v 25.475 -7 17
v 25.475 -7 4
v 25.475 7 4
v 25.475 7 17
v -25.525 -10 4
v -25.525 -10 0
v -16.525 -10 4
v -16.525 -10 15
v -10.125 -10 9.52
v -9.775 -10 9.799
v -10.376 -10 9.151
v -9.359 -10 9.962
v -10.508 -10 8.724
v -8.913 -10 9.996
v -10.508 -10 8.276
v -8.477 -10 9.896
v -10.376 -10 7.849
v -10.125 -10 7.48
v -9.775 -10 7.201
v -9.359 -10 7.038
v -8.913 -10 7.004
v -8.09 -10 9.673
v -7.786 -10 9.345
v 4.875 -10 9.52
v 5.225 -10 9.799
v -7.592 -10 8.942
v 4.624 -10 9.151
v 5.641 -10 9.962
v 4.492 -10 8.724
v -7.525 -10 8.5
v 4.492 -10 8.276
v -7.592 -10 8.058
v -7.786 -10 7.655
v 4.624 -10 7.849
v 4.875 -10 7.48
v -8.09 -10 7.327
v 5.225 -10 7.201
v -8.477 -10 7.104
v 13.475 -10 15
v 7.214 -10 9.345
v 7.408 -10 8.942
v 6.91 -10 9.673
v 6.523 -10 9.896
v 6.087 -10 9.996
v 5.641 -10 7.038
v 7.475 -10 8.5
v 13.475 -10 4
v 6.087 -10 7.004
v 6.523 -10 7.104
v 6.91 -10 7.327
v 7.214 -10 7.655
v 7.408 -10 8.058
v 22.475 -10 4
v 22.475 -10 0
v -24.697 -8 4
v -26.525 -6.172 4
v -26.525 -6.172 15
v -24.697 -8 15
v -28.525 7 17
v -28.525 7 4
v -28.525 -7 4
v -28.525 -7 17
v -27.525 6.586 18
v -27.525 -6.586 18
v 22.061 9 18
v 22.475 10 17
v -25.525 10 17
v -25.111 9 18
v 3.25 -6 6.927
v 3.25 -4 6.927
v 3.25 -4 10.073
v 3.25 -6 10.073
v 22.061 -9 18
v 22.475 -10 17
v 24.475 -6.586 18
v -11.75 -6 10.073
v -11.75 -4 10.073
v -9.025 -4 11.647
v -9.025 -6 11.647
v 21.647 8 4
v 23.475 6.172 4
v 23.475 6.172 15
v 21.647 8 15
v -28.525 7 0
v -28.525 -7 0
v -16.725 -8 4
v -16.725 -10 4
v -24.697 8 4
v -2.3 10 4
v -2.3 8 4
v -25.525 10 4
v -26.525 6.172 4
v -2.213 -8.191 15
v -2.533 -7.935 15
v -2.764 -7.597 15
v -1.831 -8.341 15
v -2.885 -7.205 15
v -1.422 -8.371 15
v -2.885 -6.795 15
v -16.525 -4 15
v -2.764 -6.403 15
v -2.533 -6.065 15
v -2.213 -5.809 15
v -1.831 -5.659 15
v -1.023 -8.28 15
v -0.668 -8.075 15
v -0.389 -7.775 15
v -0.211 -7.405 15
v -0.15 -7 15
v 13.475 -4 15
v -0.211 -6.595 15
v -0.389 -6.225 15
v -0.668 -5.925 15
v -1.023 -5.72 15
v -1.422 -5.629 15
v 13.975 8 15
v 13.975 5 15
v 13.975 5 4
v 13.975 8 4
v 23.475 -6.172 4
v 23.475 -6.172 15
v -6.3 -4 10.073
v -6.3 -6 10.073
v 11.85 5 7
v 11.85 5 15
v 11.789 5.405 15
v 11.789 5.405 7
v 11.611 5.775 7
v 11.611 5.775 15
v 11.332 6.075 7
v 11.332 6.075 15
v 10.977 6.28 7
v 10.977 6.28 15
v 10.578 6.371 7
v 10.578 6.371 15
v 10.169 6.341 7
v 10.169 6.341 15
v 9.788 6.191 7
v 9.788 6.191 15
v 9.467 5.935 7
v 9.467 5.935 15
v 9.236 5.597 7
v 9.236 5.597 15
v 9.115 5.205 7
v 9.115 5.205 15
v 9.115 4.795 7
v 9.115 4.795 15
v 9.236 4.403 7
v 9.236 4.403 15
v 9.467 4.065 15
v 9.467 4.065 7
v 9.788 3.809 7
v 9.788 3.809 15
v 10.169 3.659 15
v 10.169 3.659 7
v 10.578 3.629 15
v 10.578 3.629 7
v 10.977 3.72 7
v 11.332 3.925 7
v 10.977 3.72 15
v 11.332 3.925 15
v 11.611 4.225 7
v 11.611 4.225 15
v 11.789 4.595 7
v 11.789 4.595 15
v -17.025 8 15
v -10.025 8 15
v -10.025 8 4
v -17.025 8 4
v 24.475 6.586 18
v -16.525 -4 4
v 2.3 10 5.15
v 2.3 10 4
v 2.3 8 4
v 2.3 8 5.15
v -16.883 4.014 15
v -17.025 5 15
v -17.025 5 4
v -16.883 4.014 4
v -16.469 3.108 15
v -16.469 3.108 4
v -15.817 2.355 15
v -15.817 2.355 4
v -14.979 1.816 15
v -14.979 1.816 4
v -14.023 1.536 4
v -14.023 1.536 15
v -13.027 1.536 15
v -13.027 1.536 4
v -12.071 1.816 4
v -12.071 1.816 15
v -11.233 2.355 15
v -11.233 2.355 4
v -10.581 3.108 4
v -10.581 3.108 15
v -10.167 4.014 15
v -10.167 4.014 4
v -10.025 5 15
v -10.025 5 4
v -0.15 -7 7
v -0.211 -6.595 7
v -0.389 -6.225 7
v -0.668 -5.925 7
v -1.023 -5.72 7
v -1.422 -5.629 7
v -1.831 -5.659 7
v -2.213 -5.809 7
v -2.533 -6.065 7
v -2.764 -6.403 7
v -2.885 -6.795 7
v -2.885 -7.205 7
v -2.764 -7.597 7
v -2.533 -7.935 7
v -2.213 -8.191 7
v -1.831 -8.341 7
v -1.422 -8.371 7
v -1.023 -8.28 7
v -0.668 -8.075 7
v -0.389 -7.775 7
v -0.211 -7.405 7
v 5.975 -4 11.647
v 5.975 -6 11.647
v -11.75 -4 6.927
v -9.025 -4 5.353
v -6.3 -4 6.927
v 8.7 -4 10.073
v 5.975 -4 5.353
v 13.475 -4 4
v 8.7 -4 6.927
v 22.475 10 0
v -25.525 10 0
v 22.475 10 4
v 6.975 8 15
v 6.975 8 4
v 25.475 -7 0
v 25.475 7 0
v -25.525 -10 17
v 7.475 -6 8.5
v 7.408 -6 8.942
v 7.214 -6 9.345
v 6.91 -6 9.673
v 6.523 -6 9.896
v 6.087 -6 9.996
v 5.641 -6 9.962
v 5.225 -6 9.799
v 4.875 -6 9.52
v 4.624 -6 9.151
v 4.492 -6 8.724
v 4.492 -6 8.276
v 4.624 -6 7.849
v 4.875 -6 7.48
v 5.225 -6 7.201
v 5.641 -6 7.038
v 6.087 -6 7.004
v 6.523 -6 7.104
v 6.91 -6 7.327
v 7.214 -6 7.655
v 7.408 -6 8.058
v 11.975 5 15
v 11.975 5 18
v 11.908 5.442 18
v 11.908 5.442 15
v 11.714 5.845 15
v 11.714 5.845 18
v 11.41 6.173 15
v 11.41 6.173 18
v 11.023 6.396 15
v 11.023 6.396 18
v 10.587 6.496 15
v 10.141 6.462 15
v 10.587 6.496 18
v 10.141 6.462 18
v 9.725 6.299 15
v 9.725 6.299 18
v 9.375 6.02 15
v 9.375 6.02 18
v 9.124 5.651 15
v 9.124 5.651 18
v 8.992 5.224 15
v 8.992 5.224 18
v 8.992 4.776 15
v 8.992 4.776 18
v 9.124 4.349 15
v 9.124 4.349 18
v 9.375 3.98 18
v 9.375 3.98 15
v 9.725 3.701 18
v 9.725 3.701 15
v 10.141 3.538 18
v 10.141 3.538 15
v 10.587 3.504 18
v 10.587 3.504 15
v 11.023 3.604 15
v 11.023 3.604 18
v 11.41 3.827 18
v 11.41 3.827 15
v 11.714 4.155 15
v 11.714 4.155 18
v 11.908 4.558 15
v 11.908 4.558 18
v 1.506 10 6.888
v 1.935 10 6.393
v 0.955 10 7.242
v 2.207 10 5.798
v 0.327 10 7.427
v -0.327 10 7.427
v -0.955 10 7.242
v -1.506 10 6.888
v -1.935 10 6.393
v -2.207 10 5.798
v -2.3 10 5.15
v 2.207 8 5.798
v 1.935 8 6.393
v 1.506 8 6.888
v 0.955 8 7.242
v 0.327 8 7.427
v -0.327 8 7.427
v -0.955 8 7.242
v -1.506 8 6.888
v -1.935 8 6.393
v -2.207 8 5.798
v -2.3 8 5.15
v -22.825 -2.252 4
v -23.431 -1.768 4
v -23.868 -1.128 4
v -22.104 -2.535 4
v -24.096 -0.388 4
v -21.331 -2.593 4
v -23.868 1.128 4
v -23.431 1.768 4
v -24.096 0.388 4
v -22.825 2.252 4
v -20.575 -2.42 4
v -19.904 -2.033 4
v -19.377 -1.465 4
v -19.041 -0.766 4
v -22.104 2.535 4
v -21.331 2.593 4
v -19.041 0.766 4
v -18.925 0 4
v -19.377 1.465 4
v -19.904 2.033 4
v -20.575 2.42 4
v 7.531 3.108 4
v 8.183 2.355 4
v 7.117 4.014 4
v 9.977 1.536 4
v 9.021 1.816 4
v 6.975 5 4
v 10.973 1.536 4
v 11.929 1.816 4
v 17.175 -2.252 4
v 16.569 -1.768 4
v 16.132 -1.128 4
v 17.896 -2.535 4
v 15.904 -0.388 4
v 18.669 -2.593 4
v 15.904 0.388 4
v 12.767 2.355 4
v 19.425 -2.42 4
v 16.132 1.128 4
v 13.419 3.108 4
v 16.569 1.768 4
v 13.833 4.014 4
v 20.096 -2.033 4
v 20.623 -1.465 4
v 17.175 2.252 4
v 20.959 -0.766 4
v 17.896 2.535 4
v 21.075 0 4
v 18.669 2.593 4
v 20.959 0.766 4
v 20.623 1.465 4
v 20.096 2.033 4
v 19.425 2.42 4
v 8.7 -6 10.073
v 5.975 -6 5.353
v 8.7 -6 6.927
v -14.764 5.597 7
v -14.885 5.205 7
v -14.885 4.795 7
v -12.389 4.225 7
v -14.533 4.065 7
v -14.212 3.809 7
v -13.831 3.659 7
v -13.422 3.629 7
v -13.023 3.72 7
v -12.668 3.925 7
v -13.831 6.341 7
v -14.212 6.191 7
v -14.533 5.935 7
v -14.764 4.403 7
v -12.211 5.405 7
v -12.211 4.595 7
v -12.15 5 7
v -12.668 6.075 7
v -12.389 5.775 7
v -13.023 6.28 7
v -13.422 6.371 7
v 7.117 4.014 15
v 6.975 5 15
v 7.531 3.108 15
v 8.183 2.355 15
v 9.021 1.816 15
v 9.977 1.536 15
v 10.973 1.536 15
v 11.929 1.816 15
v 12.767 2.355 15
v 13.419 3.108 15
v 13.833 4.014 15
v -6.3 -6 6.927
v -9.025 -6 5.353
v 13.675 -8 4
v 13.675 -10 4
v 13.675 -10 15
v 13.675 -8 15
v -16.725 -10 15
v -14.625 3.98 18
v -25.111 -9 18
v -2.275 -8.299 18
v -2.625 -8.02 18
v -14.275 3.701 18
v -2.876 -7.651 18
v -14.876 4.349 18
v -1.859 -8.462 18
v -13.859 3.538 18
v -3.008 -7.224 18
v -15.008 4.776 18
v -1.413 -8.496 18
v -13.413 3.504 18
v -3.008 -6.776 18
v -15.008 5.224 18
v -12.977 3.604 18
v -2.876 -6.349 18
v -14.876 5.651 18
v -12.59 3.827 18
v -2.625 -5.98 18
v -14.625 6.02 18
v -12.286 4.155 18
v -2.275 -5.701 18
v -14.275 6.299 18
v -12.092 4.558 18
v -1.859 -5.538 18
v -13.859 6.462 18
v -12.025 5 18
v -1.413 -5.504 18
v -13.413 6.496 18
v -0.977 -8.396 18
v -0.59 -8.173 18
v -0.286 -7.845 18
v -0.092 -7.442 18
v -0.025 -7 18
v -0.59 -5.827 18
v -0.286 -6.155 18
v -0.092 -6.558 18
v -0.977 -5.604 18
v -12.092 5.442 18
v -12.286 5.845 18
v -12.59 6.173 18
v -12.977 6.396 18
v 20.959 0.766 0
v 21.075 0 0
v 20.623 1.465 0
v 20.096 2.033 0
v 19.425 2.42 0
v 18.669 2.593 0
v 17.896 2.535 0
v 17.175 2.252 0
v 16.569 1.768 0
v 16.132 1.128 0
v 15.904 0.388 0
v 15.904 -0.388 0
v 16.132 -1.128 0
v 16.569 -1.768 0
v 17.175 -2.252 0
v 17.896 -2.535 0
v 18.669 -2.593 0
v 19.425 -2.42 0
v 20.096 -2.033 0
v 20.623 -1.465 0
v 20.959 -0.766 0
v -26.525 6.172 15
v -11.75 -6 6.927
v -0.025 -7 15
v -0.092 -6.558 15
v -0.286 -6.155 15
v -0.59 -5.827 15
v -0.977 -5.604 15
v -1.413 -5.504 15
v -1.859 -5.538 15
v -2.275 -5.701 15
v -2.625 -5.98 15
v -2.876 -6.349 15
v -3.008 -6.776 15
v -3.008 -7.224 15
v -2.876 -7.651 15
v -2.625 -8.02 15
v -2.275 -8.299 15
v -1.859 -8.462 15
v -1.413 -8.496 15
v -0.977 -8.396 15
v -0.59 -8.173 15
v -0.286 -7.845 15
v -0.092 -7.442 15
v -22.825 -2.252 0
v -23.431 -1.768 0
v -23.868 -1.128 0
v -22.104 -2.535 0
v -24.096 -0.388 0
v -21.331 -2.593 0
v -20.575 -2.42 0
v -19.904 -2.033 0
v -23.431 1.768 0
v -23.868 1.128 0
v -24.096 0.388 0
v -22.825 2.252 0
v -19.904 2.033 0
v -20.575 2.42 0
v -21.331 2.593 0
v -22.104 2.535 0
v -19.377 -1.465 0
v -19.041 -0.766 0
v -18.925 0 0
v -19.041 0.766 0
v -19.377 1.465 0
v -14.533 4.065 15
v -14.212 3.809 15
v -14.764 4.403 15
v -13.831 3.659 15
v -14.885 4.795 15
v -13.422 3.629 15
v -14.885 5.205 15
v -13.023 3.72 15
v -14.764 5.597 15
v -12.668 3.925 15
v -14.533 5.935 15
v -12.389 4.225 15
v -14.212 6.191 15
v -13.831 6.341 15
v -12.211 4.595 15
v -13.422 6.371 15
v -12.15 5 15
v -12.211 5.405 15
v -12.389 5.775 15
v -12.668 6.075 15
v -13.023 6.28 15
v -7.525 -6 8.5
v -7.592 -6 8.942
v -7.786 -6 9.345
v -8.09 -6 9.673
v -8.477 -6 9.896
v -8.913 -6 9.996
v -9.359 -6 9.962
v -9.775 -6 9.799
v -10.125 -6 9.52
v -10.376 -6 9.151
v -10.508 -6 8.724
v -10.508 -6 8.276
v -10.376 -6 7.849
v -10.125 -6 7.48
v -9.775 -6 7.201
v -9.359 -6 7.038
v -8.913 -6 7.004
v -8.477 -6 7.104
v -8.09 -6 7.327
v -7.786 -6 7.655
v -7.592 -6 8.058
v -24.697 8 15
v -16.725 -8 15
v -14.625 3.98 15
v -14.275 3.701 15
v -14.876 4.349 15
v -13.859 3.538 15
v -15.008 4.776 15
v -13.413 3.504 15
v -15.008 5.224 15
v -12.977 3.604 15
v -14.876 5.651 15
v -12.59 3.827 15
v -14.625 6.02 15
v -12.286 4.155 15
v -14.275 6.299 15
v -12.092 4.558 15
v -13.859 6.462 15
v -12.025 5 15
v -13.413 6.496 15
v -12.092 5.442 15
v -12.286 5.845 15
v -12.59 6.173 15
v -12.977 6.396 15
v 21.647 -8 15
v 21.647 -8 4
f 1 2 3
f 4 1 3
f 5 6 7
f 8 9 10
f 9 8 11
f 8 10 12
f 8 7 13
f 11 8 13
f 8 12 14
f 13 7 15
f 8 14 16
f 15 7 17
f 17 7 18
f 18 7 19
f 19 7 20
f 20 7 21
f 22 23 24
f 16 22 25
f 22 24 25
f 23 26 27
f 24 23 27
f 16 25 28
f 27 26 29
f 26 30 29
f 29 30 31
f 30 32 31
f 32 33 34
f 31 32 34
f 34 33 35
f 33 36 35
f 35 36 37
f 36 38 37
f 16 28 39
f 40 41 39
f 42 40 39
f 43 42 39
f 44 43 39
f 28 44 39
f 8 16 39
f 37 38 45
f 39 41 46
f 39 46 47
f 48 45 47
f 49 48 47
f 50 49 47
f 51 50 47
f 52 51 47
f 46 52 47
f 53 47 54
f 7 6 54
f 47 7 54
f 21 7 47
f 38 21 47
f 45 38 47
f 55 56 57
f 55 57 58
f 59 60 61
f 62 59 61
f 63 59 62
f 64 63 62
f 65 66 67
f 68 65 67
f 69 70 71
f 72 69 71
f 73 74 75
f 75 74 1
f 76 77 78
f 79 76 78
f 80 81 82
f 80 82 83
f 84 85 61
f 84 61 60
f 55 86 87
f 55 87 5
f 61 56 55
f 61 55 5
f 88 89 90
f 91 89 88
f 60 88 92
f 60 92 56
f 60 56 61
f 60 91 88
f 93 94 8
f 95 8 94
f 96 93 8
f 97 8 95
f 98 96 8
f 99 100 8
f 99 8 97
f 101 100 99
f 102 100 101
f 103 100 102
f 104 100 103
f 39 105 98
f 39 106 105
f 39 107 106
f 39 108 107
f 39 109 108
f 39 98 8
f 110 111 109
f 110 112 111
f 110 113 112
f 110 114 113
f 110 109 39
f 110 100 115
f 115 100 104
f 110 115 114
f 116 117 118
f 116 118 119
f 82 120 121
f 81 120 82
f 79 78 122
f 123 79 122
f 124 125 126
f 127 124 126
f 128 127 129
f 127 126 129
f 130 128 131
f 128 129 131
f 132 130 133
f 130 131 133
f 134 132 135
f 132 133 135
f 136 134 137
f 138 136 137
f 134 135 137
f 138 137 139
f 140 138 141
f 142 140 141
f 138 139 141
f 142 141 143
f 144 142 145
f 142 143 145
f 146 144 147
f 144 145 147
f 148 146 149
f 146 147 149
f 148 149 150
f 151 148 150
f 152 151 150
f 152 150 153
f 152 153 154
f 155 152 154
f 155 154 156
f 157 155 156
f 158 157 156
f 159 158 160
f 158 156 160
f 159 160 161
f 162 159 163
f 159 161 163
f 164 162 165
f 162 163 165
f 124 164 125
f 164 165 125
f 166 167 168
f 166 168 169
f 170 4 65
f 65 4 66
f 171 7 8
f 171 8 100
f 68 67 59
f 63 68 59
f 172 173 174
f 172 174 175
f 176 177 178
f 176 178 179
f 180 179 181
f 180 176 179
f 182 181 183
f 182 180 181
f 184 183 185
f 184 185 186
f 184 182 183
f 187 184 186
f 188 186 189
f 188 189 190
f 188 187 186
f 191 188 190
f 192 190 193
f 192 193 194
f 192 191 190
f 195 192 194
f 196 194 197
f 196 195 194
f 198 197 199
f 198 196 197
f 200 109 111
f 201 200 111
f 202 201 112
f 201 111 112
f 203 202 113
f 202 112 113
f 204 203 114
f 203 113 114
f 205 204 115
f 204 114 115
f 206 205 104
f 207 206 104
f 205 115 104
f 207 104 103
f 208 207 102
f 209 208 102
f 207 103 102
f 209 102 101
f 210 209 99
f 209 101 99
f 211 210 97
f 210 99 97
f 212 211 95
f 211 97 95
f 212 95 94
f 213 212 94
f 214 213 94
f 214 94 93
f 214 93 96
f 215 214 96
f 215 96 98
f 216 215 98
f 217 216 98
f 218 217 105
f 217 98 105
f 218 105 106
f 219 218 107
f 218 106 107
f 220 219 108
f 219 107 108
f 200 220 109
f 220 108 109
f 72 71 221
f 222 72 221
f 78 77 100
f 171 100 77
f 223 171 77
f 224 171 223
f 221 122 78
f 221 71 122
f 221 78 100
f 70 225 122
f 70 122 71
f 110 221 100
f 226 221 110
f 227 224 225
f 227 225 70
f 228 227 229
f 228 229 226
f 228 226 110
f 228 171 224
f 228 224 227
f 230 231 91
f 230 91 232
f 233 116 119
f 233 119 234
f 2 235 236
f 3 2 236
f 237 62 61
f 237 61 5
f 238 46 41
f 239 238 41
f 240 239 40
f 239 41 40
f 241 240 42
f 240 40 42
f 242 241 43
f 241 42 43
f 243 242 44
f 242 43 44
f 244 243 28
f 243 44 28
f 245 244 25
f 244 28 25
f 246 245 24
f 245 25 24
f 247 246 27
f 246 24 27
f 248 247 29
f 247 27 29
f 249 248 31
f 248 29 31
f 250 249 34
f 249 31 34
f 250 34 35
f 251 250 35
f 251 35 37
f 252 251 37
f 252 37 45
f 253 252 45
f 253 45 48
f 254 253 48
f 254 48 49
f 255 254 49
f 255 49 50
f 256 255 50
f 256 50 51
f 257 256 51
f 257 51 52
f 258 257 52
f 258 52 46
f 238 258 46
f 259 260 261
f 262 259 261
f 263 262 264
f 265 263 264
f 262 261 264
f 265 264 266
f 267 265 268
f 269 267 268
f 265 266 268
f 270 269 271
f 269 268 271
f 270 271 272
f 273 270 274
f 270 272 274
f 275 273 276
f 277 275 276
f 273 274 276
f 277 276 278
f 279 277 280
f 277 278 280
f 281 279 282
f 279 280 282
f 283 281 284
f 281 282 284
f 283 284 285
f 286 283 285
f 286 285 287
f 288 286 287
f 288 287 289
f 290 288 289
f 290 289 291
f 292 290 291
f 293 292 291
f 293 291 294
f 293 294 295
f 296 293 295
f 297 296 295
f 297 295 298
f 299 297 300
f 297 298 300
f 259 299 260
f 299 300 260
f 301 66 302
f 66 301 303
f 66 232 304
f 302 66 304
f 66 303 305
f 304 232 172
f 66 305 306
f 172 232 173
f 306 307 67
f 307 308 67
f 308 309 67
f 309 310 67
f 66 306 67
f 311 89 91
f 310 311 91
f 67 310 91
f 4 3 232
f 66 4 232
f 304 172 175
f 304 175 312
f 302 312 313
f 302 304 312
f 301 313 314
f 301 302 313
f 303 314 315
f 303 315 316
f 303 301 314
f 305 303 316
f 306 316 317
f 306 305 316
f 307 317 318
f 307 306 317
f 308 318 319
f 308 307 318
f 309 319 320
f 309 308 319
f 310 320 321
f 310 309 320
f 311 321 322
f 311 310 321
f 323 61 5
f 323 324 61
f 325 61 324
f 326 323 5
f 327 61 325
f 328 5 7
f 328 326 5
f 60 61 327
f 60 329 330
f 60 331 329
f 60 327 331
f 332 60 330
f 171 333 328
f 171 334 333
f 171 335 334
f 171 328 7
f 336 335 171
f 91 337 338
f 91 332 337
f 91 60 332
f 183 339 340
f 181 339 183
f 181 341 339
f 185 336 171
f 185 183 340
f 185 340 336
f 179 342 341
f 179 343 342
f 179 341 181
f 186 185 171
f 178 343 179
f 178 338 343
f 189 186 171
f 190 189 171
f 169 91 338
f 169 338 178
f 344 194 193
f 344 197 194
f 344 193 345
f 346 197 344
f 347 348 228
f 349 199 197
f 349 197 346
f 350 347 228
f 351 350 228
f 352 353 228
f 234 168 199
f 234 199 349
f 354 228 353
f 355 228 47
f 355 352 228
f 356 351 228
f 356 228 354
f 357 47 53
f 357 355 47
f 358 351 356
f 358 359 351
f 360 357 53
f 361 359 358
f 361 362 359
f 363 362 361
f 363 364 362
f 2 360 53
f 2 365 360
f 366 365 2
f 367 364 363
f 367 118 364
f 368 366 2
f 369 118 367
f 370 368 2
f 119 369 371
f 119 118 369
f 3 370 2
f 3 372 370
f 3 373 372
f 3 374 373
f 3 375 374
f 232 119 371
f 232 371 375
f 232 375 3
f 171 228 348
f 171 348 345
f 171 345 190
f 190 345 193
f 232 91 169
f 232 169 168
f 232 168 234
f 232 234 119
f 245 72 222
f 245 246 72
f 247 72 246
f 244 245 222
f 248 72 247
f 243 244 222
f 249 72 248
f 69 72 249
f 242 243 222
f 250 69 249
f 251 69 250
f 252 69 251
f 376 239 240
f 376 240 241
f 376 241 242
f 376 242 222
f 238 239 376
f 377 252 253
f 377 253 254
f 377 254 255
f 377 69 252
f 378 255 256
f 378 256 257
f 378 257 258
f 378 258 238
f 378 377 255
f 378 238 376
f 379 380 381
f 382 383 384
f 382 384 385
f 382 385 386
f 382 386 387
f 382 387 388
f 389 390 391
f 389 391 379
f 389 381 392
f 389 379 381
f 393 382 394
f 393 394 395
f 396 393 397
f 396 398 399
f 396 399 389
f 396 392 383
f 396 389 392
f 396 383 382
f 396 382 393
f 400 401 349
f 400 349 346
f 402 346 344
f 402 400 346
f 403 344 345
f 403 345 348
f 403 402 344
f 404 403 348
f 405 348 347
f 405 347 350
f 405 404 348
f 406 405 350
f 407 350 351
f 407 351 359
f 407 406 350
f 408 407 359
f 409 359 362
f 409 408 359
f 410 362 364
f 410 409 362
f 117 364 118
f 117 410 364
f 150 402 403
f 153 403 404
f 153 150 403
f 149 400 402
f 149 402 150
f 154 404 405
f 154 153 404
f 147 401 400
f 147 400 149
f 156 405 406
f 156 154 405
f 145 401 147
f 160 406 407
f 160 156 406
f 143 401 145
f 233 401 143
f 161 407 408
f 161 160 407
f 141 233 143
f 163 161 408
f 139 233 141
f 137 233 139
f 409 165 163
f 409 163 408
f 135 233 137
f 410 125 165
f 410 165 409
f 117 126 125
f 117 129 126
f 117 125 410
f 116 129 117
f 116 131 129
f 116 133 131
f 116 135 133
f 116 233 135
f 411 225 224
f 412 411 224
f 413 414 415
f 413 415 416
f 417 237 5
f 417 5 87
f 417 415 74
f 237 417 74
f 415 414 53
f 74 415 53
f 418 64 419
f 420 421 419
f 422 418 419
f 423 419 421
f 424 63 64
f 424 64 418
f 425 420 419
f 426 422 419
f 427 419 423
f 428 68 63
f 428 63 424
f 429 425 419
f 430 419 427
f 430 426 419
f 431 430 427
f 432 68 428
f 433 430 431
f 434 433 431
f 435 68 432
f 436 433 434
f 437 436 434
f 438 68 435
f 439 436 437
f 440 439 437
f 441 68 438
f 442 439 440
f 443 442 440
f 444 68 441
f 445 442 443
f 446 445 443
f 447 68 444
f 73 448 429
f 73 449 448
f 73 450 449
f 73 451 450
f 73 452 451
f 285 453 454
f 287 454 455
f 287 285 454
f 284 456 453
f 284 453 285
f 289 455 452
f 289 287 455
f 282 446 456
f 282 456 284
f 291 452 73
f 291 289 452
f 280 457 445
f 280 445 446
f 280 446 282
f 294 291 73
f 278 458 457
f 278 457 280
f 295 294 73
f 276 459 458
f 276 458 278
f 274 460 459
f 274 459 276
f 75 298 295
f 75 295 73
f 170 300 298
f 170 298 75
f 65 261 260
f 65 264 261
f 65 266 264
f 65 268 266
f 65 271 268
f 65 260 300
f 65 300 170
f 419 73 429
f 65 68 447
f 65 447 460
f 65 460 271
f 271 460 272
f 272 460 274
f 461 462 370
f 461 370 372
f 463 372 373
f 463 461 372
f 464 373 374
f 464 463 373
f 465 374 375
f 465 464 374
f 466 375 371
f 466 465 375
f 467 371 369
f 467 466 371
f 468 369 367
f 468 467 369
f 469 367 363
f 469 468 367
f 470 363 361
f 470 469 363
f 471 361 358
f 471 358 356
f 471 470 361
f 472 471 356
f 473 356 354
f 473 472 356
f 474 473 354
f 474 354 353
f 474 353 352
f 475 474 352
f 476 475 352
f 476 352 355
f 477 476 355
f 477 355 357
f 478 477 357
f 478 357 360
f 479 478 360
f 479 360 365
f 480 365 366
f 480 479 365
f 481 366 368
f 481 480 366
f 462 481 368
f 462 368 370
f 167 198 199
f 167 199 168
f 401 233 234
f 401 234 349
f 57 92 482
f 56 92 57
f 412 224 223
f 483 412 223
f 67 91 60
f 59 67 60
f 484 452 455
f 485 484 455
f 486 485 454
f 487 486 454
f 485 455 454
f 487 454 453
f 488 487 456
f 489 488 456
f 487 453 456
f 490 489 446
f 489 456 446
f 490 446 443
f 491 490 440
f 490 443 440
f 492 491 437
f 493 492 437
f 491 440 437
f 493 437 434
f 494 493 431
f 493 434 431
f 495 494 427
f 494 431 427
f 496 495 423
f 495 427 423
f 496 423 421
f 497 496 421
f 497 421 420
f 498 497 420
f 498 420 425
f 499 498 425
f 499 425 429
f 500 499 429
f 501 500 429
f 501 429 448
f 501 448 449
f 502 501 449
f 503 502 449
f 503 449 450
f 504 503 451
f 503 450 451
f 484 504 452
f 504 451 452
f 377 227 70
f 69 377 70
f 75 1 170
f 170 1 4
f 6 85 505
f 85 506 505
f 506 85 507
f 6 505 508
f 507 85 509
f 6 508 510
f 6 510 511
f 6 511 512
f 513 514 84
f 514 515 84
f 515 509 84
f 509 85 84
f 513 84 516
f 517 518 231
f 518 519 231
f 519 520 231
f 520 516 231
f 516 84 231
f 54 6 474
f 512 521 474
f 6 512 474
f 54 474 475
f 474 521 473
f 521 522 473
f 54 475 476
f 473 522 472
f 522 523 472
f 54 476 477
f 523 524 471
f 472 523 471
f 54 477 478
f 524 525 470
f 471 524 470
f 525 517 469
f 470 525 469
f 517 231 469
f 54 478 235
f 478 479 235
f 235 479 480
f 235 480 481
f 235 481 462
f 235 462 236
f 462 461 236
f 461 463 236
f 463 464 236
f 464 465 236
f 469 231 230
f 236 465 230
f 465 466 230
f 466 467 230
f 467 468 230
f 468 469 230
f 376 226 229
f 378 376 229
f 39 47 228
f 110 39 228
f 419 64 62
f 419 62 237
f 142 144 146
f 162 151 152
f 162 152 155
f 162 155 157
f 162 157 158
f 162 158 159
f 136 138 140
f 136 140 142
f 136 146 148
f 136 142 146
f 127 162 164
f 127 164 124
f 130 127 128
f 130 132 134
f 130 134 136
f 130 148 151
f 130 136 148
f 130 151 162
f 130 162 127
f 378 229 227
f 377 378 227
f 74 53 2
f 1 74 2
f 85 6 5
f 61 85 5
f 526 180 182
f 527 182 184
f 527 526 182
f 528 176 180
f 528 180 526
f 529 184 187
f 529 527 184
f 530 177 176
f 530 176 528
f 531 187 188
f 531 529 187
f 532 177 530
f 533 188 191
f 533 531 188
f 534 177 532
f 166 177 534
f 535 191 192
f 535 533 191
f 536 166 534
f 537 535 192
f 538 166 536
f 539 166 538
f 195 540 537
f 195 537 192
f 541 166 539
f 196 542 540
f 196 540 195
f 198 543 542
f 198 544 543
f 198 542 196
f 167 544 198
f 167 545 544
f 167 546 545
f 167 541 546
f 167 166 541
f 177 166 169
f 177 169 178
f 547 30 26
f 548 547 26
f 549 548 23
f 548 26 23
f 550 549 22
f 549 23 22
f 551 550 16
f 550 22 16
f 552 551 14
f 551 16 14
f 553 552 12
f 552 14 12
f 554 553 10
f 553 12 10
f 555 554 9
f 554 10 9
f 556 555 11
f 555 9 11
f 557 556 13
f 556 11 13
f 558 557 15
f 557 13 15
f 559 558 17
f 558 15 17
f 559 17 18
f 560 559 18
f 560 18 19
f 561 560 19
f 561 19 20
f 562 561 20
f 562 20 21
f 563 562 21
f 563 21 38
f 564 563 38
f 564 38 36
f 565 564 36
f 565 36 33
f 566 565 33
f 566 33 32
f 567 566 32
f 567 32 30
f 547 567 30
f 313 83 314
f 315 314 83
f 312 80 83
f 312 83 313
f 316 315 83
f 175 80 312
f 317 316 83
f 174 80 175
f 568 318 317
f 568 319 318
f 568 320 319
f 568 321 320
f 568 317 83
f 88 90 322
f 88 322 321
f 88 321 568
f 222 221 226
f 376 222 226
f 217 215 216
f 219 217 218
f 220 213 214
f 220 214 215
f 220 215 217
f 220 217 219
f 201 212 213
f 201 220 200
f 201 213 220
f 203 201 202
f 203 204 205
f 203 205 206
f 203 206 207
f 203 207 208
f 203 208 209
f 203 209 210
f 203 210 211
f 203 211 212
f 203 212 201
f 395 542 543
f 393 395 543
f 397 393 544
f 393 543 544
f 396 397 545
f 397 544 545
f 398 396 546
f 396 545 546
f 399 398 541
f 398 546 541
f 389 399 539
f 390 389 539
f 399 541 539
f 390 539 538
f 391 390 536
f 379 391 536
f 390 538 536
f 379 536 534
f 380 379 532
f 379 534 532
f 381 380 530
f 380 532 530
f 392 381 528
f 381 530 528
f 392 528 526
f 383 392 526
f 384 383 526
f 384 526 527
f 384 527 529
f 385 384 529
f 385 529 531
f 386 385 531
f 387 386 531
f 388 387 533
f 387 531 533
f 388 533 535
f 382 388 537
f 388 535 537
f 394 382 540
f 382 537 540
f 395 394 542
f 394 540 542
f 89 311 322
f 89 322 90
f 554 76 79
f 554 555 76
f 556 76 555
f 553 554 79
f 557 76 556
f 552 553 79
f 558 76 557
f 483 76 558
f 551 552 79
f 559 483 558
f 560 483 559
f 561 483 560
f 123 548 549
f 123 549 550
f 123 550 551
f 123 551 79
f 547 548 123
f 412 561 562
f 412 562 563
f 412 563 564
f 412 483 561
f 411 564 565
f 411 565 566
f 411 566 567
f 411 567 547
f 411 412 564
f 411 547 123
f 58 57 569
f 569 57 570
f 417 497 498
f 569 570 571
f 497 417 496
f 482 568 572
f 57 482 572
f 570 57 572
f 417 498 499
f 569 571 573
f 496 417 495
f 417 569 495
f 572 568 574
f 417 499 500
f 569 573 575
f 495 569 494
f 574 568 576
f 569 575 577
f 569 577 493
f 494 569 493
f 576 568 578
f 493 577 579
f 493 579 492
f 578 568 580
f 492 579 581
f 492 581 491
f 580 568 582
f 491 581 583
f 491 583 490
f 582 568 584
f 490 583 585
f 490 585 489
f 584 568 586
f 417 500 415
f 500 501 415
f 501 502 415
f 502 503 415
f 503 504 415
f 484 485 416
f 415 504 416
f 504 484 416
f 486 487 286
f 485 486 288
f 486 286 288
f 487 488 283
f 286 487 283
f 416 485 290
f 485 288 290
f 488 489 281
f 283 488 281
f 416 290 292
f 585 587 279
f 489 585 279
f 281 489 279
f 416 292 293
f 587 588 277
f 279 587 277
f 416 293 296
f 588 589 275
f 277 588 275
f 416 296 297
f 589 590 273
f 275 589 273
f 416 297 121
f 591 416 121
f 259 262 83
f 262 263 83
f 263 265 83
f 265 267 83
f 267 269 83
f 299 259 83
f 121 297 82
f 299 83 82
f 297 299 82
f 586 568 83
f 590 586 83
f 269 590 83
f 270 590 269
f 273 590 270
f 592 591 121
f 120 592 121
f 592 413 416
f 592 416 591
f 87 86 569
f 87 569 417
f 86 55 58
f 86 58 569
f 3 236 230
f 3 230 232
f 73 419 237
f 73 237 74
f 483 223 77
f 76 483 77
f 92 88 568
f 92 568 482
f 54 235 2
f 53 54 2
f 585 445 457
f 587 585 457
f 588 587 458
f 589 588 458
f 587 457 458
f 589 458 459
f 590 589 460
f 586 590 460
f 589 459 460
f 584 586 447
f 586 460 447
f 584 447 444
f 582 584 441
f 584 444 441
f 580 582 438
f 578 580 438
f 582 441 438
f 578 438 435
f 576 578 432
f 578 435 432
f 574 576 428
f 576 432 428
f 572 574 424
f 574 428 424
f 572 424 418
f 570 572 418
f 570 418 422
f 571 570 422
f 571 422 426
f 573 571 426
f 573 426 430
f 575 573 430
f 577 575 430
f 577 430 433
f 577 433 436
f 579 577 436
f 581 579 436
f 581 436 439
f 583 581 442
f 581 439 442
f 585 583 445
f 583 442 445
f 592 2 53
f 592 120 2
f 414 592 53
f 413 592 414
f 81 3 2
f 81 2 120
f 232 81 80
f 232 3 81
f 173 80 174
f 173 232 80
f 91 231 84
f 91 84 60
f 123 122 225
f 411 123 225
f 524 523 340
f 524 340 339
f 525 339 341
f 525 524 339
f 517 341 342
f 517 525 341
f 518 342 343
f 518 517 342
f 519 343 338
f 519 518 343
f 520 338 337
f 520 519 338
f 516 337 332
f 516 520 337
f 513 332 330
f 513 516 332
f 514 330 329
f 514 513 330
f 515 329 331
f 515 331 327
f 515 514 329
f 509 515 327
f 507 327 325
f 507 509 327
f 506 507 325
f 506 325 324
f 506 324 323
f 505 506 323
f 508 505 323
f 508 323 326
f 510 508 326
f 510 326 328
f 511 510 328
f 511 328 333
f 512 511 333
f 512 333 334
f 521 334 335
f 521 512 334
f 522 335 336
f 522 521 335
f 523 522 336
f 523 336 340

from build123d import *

# Parameters (mm, degrees)
SKETCH3_W           = 54
SKETCH3_H           = 20
SKETCH3_R           = 2.6
BOSS_EXTRUDE1_DEPTH = 4
SKETCH4_W           = 30
SKETCH4_H           = 6
BOSS_EXTRUDE2_DEPTH = 11
SKETCH5_R           = 1.5
CUT_EXTRUDE1_DEPTH  = 6
CUT_EXTRUDE2_DEPTH  = 2
CHAMFER1_SIZE       = 3
BOSS_EXTRUDE3_DEPTH = 11
BOSS_EXTRUDE4_DEPTH = 3
SKETCH11_R          = 1.5
CUT_EXTRUDE3_DEPTH  = 3
BOSS_EXTRUDE5_DEPTH = 11
SKETCH13_R          = 1.375
CUT_EXTRUDE4_DEPTH  = 8
CHAMFER2_SIZE       = 1
CUT_EXTRUDE5_DEPTH  = 2


with BuildPart() as part:
    # Sketch3 → Boss-Extrude1 (new body)
    with BuildSketch(Plane.XY):
        with Locations((-1.525, 0)):
            Rectangle(SKETCH3_W, SKETCH3_H)
        with Locations((-21.525, 0)):
            Circle(SKETCH3_R, mode=Mode.SUBTRACT)
        with Locations((18.475, 0)):
            Circle(SKETCH3_R, mode=Mode.SUBTRACT)
    extrude(amount=BOSS_EXTRUDE1_DEPTH)

    # Sketch4 → Boss-Extrude2 (add)
    with BuildSketch(Plane.XY.offset(4)):
        with Locations((-1.525, -7)):
            Rectangle(SKETCH4_W, SKETCH4_H)
    extrude(amount=BOSS_EXTRUDE2_DEPTH)

    # Sketch5 → Cut-Extrude1 (cut)
    with BuildSketch(Plane.XZ.offset(10)):
        with Locations((-9.025, 8.5)):
            Circle(SKETCH5_R)
        with Locations((5.975, 8.5)):
            Circle(SKETCH5_R)
    extrude(amount=-CUT_EXTRUDE1_DEPTH, mode=Mode.SUBTRACT)

    # Sketch6 → Cut-Extrude2 (cut)
    with BuildSketch(Plane(origin=(0, -4, 0), x_dir=(1, 0, 0), z_dir=(0, 1, 0))):
        Polygon((-9.025, -5.353441033), (-11.75, -6.926720516), (-11.75, -10.073279484), (-9.025, -11.646558967), (-6.3, -10.073279484), (-6.3, -6.926720516), align=None)
        Polygon((5.975, -5.353441033), (3.25, -6.926720516), (3.25, -10.073279484), (5.975, -11.646558967), (8.7, -10.073279484), (8.7, -6.926720516), align=None)
    extrude(amount=-CUT_EXTRUDE2_DEPTH, mode=Mode.SUBTRACT)

    # Chamfer1
    chamfer1_edges = [part.edges().sort_by_distance(p)[0] for p in [
        (-28.525, 10, 2),
        (25.475, 10, 2),
        (25.475, -10, 2),
        (-28.525, -10, 2),
    ]]
    chamfer(chamfer1_edges, length=CHAMFER1_SIZE)

    # Sketch12 → Boss-Extrude5 (add)
    with BuildSketch(Plane(origin=(0, 0, 15), x_dir=(-1, 0, 0), z_dir=(0, 0, -1))):
        with BuildLine():
            Line((10.025, 5), (10.025, 8))
            Line((10.025, 8), (17.025, 8))
            Line((17.025, 8), (17.025, 5))
            ThreePointArc((17.025, 5), (13.525, 1.5), (10.025, 5))
        make_face()
        with BuildLine():
            Line((-13.975, 5), (-13.975, 8))
            Line((-13.975, 8), (-6.975, 8))
            Line((-6.975, 8), (-6.975, 5))
            ThreePointArc((-6.975, 5), (-10.475, 1.5), (-13.975, 5))
        make_face()
    extrude(amount=BOSS_EXTRUDE5_DEPTH)

    # Sketch13 → Cut-Extrude4 (cut)
    with BuildSketch(Plane.XY.offset(15)):
        with Locations((-13.525, 5)):
            Circle(SKETCH13_R)
        with Locations((10.475, 5)):
            Circle(SKETCH13_R)
        with Locations((-1.525, -7)):
            Circle(SKETCH13_R)
    extrude(amount=-CUT_EXTRUDE4_DEPTH, mode=Mode.SUBTRACT)


with BuildPart() as body_2:
    # Sketch9 → Boss-Extrude3 (new body)
    with BuildSketch(Plane.XY.offset(4)):
        Polygon((22.475, -10), (13.675, -10), (13.675, -8), (21.646572875, -8), (23.475, -6.171572875), (23.475, 6.171572875), (21.646572875, 8), (-24.696572875, 8), (-26.525, 6.171572875), (-26.525, -6.171572875), (-24.696572875, -8), (-16.725, -8), (-16.725, -10), (-25.525, -10), (-28.525, -7), (-28.525, 7), (-25.525, 10), (22.475, 10), (25.475, 7), (25.475, -7), align=None)
    extrude(amount=BOSS_EXTRUDE3_DEPTH)

    # Sketch10 → Boss-Extrude4 (add)
    with BuildSketch(Plane.XY.offset(15)):
        Polygon((-25.525, -10), (22.475, -10), (25.475, -7), (25.475, 7), (22.475, 10), (-25.525, 10), (-28.525, 7), (-28.525, -7), align=None)
    extrude(amount=BOSS_EXTRUDE4_DEPTH)

    # Sketch11 → Cut-Extrude3 (cut)
    with BuildSketch(Plane.XY.offset(18)):
        with Locations((-1.525, -7)):
            Circle(SKETCH11_R)
        with Locations((-13.525, 5)):
            Circle(SKETCH11_R)
        with Locations((10.475, 5)):
            Circle(SKETCH11_R)
    extrude(amount=-CUT_EXTRUDE3_DEPTH, mode=Mode.SUBTRACT)

    # Chamfer2
    chamfer2_edges = [body_2.edges().sort_by_distance(p)[0] for p in [
        (-27.025, -8.5, 18),
        (-1.525, -10, 18),
        (23.975, -8.5, 18),
        (25.475, 0, 18),
        (23.975, 8.5, 18),
        (-1.525, 10, 18),
        (-27.025, 8.5, 18),
        (-28.525, 0, 18),
    ]]
    chamfer(chamfer2_edges, length=CHAMFER2_SIZE)

    # Sketch14 → Cut-Extrude5 (cut)
    with BuildSketch(Plane(origin=(0, 10, 0), x_dir=(1, 0, 0), z_dir=(0, 1, 0))):
        with BuildLine():
            Line((-2.3, -5.15), (-2.3, -4))
            Line((-2.3, -4), (2.3, -4))
            Line((2.3, -4), (2.3, -5.15))
            ThreePointArc((2.3, -5.15), (0, -7.45), (-2.3, -5.15))
        make_face()
    extrude(amount=-CUT_EXTRUDE5_DEPTH, mode=Mode.SUBTRACT)


solid = Compound([part.part, body_2.part])
